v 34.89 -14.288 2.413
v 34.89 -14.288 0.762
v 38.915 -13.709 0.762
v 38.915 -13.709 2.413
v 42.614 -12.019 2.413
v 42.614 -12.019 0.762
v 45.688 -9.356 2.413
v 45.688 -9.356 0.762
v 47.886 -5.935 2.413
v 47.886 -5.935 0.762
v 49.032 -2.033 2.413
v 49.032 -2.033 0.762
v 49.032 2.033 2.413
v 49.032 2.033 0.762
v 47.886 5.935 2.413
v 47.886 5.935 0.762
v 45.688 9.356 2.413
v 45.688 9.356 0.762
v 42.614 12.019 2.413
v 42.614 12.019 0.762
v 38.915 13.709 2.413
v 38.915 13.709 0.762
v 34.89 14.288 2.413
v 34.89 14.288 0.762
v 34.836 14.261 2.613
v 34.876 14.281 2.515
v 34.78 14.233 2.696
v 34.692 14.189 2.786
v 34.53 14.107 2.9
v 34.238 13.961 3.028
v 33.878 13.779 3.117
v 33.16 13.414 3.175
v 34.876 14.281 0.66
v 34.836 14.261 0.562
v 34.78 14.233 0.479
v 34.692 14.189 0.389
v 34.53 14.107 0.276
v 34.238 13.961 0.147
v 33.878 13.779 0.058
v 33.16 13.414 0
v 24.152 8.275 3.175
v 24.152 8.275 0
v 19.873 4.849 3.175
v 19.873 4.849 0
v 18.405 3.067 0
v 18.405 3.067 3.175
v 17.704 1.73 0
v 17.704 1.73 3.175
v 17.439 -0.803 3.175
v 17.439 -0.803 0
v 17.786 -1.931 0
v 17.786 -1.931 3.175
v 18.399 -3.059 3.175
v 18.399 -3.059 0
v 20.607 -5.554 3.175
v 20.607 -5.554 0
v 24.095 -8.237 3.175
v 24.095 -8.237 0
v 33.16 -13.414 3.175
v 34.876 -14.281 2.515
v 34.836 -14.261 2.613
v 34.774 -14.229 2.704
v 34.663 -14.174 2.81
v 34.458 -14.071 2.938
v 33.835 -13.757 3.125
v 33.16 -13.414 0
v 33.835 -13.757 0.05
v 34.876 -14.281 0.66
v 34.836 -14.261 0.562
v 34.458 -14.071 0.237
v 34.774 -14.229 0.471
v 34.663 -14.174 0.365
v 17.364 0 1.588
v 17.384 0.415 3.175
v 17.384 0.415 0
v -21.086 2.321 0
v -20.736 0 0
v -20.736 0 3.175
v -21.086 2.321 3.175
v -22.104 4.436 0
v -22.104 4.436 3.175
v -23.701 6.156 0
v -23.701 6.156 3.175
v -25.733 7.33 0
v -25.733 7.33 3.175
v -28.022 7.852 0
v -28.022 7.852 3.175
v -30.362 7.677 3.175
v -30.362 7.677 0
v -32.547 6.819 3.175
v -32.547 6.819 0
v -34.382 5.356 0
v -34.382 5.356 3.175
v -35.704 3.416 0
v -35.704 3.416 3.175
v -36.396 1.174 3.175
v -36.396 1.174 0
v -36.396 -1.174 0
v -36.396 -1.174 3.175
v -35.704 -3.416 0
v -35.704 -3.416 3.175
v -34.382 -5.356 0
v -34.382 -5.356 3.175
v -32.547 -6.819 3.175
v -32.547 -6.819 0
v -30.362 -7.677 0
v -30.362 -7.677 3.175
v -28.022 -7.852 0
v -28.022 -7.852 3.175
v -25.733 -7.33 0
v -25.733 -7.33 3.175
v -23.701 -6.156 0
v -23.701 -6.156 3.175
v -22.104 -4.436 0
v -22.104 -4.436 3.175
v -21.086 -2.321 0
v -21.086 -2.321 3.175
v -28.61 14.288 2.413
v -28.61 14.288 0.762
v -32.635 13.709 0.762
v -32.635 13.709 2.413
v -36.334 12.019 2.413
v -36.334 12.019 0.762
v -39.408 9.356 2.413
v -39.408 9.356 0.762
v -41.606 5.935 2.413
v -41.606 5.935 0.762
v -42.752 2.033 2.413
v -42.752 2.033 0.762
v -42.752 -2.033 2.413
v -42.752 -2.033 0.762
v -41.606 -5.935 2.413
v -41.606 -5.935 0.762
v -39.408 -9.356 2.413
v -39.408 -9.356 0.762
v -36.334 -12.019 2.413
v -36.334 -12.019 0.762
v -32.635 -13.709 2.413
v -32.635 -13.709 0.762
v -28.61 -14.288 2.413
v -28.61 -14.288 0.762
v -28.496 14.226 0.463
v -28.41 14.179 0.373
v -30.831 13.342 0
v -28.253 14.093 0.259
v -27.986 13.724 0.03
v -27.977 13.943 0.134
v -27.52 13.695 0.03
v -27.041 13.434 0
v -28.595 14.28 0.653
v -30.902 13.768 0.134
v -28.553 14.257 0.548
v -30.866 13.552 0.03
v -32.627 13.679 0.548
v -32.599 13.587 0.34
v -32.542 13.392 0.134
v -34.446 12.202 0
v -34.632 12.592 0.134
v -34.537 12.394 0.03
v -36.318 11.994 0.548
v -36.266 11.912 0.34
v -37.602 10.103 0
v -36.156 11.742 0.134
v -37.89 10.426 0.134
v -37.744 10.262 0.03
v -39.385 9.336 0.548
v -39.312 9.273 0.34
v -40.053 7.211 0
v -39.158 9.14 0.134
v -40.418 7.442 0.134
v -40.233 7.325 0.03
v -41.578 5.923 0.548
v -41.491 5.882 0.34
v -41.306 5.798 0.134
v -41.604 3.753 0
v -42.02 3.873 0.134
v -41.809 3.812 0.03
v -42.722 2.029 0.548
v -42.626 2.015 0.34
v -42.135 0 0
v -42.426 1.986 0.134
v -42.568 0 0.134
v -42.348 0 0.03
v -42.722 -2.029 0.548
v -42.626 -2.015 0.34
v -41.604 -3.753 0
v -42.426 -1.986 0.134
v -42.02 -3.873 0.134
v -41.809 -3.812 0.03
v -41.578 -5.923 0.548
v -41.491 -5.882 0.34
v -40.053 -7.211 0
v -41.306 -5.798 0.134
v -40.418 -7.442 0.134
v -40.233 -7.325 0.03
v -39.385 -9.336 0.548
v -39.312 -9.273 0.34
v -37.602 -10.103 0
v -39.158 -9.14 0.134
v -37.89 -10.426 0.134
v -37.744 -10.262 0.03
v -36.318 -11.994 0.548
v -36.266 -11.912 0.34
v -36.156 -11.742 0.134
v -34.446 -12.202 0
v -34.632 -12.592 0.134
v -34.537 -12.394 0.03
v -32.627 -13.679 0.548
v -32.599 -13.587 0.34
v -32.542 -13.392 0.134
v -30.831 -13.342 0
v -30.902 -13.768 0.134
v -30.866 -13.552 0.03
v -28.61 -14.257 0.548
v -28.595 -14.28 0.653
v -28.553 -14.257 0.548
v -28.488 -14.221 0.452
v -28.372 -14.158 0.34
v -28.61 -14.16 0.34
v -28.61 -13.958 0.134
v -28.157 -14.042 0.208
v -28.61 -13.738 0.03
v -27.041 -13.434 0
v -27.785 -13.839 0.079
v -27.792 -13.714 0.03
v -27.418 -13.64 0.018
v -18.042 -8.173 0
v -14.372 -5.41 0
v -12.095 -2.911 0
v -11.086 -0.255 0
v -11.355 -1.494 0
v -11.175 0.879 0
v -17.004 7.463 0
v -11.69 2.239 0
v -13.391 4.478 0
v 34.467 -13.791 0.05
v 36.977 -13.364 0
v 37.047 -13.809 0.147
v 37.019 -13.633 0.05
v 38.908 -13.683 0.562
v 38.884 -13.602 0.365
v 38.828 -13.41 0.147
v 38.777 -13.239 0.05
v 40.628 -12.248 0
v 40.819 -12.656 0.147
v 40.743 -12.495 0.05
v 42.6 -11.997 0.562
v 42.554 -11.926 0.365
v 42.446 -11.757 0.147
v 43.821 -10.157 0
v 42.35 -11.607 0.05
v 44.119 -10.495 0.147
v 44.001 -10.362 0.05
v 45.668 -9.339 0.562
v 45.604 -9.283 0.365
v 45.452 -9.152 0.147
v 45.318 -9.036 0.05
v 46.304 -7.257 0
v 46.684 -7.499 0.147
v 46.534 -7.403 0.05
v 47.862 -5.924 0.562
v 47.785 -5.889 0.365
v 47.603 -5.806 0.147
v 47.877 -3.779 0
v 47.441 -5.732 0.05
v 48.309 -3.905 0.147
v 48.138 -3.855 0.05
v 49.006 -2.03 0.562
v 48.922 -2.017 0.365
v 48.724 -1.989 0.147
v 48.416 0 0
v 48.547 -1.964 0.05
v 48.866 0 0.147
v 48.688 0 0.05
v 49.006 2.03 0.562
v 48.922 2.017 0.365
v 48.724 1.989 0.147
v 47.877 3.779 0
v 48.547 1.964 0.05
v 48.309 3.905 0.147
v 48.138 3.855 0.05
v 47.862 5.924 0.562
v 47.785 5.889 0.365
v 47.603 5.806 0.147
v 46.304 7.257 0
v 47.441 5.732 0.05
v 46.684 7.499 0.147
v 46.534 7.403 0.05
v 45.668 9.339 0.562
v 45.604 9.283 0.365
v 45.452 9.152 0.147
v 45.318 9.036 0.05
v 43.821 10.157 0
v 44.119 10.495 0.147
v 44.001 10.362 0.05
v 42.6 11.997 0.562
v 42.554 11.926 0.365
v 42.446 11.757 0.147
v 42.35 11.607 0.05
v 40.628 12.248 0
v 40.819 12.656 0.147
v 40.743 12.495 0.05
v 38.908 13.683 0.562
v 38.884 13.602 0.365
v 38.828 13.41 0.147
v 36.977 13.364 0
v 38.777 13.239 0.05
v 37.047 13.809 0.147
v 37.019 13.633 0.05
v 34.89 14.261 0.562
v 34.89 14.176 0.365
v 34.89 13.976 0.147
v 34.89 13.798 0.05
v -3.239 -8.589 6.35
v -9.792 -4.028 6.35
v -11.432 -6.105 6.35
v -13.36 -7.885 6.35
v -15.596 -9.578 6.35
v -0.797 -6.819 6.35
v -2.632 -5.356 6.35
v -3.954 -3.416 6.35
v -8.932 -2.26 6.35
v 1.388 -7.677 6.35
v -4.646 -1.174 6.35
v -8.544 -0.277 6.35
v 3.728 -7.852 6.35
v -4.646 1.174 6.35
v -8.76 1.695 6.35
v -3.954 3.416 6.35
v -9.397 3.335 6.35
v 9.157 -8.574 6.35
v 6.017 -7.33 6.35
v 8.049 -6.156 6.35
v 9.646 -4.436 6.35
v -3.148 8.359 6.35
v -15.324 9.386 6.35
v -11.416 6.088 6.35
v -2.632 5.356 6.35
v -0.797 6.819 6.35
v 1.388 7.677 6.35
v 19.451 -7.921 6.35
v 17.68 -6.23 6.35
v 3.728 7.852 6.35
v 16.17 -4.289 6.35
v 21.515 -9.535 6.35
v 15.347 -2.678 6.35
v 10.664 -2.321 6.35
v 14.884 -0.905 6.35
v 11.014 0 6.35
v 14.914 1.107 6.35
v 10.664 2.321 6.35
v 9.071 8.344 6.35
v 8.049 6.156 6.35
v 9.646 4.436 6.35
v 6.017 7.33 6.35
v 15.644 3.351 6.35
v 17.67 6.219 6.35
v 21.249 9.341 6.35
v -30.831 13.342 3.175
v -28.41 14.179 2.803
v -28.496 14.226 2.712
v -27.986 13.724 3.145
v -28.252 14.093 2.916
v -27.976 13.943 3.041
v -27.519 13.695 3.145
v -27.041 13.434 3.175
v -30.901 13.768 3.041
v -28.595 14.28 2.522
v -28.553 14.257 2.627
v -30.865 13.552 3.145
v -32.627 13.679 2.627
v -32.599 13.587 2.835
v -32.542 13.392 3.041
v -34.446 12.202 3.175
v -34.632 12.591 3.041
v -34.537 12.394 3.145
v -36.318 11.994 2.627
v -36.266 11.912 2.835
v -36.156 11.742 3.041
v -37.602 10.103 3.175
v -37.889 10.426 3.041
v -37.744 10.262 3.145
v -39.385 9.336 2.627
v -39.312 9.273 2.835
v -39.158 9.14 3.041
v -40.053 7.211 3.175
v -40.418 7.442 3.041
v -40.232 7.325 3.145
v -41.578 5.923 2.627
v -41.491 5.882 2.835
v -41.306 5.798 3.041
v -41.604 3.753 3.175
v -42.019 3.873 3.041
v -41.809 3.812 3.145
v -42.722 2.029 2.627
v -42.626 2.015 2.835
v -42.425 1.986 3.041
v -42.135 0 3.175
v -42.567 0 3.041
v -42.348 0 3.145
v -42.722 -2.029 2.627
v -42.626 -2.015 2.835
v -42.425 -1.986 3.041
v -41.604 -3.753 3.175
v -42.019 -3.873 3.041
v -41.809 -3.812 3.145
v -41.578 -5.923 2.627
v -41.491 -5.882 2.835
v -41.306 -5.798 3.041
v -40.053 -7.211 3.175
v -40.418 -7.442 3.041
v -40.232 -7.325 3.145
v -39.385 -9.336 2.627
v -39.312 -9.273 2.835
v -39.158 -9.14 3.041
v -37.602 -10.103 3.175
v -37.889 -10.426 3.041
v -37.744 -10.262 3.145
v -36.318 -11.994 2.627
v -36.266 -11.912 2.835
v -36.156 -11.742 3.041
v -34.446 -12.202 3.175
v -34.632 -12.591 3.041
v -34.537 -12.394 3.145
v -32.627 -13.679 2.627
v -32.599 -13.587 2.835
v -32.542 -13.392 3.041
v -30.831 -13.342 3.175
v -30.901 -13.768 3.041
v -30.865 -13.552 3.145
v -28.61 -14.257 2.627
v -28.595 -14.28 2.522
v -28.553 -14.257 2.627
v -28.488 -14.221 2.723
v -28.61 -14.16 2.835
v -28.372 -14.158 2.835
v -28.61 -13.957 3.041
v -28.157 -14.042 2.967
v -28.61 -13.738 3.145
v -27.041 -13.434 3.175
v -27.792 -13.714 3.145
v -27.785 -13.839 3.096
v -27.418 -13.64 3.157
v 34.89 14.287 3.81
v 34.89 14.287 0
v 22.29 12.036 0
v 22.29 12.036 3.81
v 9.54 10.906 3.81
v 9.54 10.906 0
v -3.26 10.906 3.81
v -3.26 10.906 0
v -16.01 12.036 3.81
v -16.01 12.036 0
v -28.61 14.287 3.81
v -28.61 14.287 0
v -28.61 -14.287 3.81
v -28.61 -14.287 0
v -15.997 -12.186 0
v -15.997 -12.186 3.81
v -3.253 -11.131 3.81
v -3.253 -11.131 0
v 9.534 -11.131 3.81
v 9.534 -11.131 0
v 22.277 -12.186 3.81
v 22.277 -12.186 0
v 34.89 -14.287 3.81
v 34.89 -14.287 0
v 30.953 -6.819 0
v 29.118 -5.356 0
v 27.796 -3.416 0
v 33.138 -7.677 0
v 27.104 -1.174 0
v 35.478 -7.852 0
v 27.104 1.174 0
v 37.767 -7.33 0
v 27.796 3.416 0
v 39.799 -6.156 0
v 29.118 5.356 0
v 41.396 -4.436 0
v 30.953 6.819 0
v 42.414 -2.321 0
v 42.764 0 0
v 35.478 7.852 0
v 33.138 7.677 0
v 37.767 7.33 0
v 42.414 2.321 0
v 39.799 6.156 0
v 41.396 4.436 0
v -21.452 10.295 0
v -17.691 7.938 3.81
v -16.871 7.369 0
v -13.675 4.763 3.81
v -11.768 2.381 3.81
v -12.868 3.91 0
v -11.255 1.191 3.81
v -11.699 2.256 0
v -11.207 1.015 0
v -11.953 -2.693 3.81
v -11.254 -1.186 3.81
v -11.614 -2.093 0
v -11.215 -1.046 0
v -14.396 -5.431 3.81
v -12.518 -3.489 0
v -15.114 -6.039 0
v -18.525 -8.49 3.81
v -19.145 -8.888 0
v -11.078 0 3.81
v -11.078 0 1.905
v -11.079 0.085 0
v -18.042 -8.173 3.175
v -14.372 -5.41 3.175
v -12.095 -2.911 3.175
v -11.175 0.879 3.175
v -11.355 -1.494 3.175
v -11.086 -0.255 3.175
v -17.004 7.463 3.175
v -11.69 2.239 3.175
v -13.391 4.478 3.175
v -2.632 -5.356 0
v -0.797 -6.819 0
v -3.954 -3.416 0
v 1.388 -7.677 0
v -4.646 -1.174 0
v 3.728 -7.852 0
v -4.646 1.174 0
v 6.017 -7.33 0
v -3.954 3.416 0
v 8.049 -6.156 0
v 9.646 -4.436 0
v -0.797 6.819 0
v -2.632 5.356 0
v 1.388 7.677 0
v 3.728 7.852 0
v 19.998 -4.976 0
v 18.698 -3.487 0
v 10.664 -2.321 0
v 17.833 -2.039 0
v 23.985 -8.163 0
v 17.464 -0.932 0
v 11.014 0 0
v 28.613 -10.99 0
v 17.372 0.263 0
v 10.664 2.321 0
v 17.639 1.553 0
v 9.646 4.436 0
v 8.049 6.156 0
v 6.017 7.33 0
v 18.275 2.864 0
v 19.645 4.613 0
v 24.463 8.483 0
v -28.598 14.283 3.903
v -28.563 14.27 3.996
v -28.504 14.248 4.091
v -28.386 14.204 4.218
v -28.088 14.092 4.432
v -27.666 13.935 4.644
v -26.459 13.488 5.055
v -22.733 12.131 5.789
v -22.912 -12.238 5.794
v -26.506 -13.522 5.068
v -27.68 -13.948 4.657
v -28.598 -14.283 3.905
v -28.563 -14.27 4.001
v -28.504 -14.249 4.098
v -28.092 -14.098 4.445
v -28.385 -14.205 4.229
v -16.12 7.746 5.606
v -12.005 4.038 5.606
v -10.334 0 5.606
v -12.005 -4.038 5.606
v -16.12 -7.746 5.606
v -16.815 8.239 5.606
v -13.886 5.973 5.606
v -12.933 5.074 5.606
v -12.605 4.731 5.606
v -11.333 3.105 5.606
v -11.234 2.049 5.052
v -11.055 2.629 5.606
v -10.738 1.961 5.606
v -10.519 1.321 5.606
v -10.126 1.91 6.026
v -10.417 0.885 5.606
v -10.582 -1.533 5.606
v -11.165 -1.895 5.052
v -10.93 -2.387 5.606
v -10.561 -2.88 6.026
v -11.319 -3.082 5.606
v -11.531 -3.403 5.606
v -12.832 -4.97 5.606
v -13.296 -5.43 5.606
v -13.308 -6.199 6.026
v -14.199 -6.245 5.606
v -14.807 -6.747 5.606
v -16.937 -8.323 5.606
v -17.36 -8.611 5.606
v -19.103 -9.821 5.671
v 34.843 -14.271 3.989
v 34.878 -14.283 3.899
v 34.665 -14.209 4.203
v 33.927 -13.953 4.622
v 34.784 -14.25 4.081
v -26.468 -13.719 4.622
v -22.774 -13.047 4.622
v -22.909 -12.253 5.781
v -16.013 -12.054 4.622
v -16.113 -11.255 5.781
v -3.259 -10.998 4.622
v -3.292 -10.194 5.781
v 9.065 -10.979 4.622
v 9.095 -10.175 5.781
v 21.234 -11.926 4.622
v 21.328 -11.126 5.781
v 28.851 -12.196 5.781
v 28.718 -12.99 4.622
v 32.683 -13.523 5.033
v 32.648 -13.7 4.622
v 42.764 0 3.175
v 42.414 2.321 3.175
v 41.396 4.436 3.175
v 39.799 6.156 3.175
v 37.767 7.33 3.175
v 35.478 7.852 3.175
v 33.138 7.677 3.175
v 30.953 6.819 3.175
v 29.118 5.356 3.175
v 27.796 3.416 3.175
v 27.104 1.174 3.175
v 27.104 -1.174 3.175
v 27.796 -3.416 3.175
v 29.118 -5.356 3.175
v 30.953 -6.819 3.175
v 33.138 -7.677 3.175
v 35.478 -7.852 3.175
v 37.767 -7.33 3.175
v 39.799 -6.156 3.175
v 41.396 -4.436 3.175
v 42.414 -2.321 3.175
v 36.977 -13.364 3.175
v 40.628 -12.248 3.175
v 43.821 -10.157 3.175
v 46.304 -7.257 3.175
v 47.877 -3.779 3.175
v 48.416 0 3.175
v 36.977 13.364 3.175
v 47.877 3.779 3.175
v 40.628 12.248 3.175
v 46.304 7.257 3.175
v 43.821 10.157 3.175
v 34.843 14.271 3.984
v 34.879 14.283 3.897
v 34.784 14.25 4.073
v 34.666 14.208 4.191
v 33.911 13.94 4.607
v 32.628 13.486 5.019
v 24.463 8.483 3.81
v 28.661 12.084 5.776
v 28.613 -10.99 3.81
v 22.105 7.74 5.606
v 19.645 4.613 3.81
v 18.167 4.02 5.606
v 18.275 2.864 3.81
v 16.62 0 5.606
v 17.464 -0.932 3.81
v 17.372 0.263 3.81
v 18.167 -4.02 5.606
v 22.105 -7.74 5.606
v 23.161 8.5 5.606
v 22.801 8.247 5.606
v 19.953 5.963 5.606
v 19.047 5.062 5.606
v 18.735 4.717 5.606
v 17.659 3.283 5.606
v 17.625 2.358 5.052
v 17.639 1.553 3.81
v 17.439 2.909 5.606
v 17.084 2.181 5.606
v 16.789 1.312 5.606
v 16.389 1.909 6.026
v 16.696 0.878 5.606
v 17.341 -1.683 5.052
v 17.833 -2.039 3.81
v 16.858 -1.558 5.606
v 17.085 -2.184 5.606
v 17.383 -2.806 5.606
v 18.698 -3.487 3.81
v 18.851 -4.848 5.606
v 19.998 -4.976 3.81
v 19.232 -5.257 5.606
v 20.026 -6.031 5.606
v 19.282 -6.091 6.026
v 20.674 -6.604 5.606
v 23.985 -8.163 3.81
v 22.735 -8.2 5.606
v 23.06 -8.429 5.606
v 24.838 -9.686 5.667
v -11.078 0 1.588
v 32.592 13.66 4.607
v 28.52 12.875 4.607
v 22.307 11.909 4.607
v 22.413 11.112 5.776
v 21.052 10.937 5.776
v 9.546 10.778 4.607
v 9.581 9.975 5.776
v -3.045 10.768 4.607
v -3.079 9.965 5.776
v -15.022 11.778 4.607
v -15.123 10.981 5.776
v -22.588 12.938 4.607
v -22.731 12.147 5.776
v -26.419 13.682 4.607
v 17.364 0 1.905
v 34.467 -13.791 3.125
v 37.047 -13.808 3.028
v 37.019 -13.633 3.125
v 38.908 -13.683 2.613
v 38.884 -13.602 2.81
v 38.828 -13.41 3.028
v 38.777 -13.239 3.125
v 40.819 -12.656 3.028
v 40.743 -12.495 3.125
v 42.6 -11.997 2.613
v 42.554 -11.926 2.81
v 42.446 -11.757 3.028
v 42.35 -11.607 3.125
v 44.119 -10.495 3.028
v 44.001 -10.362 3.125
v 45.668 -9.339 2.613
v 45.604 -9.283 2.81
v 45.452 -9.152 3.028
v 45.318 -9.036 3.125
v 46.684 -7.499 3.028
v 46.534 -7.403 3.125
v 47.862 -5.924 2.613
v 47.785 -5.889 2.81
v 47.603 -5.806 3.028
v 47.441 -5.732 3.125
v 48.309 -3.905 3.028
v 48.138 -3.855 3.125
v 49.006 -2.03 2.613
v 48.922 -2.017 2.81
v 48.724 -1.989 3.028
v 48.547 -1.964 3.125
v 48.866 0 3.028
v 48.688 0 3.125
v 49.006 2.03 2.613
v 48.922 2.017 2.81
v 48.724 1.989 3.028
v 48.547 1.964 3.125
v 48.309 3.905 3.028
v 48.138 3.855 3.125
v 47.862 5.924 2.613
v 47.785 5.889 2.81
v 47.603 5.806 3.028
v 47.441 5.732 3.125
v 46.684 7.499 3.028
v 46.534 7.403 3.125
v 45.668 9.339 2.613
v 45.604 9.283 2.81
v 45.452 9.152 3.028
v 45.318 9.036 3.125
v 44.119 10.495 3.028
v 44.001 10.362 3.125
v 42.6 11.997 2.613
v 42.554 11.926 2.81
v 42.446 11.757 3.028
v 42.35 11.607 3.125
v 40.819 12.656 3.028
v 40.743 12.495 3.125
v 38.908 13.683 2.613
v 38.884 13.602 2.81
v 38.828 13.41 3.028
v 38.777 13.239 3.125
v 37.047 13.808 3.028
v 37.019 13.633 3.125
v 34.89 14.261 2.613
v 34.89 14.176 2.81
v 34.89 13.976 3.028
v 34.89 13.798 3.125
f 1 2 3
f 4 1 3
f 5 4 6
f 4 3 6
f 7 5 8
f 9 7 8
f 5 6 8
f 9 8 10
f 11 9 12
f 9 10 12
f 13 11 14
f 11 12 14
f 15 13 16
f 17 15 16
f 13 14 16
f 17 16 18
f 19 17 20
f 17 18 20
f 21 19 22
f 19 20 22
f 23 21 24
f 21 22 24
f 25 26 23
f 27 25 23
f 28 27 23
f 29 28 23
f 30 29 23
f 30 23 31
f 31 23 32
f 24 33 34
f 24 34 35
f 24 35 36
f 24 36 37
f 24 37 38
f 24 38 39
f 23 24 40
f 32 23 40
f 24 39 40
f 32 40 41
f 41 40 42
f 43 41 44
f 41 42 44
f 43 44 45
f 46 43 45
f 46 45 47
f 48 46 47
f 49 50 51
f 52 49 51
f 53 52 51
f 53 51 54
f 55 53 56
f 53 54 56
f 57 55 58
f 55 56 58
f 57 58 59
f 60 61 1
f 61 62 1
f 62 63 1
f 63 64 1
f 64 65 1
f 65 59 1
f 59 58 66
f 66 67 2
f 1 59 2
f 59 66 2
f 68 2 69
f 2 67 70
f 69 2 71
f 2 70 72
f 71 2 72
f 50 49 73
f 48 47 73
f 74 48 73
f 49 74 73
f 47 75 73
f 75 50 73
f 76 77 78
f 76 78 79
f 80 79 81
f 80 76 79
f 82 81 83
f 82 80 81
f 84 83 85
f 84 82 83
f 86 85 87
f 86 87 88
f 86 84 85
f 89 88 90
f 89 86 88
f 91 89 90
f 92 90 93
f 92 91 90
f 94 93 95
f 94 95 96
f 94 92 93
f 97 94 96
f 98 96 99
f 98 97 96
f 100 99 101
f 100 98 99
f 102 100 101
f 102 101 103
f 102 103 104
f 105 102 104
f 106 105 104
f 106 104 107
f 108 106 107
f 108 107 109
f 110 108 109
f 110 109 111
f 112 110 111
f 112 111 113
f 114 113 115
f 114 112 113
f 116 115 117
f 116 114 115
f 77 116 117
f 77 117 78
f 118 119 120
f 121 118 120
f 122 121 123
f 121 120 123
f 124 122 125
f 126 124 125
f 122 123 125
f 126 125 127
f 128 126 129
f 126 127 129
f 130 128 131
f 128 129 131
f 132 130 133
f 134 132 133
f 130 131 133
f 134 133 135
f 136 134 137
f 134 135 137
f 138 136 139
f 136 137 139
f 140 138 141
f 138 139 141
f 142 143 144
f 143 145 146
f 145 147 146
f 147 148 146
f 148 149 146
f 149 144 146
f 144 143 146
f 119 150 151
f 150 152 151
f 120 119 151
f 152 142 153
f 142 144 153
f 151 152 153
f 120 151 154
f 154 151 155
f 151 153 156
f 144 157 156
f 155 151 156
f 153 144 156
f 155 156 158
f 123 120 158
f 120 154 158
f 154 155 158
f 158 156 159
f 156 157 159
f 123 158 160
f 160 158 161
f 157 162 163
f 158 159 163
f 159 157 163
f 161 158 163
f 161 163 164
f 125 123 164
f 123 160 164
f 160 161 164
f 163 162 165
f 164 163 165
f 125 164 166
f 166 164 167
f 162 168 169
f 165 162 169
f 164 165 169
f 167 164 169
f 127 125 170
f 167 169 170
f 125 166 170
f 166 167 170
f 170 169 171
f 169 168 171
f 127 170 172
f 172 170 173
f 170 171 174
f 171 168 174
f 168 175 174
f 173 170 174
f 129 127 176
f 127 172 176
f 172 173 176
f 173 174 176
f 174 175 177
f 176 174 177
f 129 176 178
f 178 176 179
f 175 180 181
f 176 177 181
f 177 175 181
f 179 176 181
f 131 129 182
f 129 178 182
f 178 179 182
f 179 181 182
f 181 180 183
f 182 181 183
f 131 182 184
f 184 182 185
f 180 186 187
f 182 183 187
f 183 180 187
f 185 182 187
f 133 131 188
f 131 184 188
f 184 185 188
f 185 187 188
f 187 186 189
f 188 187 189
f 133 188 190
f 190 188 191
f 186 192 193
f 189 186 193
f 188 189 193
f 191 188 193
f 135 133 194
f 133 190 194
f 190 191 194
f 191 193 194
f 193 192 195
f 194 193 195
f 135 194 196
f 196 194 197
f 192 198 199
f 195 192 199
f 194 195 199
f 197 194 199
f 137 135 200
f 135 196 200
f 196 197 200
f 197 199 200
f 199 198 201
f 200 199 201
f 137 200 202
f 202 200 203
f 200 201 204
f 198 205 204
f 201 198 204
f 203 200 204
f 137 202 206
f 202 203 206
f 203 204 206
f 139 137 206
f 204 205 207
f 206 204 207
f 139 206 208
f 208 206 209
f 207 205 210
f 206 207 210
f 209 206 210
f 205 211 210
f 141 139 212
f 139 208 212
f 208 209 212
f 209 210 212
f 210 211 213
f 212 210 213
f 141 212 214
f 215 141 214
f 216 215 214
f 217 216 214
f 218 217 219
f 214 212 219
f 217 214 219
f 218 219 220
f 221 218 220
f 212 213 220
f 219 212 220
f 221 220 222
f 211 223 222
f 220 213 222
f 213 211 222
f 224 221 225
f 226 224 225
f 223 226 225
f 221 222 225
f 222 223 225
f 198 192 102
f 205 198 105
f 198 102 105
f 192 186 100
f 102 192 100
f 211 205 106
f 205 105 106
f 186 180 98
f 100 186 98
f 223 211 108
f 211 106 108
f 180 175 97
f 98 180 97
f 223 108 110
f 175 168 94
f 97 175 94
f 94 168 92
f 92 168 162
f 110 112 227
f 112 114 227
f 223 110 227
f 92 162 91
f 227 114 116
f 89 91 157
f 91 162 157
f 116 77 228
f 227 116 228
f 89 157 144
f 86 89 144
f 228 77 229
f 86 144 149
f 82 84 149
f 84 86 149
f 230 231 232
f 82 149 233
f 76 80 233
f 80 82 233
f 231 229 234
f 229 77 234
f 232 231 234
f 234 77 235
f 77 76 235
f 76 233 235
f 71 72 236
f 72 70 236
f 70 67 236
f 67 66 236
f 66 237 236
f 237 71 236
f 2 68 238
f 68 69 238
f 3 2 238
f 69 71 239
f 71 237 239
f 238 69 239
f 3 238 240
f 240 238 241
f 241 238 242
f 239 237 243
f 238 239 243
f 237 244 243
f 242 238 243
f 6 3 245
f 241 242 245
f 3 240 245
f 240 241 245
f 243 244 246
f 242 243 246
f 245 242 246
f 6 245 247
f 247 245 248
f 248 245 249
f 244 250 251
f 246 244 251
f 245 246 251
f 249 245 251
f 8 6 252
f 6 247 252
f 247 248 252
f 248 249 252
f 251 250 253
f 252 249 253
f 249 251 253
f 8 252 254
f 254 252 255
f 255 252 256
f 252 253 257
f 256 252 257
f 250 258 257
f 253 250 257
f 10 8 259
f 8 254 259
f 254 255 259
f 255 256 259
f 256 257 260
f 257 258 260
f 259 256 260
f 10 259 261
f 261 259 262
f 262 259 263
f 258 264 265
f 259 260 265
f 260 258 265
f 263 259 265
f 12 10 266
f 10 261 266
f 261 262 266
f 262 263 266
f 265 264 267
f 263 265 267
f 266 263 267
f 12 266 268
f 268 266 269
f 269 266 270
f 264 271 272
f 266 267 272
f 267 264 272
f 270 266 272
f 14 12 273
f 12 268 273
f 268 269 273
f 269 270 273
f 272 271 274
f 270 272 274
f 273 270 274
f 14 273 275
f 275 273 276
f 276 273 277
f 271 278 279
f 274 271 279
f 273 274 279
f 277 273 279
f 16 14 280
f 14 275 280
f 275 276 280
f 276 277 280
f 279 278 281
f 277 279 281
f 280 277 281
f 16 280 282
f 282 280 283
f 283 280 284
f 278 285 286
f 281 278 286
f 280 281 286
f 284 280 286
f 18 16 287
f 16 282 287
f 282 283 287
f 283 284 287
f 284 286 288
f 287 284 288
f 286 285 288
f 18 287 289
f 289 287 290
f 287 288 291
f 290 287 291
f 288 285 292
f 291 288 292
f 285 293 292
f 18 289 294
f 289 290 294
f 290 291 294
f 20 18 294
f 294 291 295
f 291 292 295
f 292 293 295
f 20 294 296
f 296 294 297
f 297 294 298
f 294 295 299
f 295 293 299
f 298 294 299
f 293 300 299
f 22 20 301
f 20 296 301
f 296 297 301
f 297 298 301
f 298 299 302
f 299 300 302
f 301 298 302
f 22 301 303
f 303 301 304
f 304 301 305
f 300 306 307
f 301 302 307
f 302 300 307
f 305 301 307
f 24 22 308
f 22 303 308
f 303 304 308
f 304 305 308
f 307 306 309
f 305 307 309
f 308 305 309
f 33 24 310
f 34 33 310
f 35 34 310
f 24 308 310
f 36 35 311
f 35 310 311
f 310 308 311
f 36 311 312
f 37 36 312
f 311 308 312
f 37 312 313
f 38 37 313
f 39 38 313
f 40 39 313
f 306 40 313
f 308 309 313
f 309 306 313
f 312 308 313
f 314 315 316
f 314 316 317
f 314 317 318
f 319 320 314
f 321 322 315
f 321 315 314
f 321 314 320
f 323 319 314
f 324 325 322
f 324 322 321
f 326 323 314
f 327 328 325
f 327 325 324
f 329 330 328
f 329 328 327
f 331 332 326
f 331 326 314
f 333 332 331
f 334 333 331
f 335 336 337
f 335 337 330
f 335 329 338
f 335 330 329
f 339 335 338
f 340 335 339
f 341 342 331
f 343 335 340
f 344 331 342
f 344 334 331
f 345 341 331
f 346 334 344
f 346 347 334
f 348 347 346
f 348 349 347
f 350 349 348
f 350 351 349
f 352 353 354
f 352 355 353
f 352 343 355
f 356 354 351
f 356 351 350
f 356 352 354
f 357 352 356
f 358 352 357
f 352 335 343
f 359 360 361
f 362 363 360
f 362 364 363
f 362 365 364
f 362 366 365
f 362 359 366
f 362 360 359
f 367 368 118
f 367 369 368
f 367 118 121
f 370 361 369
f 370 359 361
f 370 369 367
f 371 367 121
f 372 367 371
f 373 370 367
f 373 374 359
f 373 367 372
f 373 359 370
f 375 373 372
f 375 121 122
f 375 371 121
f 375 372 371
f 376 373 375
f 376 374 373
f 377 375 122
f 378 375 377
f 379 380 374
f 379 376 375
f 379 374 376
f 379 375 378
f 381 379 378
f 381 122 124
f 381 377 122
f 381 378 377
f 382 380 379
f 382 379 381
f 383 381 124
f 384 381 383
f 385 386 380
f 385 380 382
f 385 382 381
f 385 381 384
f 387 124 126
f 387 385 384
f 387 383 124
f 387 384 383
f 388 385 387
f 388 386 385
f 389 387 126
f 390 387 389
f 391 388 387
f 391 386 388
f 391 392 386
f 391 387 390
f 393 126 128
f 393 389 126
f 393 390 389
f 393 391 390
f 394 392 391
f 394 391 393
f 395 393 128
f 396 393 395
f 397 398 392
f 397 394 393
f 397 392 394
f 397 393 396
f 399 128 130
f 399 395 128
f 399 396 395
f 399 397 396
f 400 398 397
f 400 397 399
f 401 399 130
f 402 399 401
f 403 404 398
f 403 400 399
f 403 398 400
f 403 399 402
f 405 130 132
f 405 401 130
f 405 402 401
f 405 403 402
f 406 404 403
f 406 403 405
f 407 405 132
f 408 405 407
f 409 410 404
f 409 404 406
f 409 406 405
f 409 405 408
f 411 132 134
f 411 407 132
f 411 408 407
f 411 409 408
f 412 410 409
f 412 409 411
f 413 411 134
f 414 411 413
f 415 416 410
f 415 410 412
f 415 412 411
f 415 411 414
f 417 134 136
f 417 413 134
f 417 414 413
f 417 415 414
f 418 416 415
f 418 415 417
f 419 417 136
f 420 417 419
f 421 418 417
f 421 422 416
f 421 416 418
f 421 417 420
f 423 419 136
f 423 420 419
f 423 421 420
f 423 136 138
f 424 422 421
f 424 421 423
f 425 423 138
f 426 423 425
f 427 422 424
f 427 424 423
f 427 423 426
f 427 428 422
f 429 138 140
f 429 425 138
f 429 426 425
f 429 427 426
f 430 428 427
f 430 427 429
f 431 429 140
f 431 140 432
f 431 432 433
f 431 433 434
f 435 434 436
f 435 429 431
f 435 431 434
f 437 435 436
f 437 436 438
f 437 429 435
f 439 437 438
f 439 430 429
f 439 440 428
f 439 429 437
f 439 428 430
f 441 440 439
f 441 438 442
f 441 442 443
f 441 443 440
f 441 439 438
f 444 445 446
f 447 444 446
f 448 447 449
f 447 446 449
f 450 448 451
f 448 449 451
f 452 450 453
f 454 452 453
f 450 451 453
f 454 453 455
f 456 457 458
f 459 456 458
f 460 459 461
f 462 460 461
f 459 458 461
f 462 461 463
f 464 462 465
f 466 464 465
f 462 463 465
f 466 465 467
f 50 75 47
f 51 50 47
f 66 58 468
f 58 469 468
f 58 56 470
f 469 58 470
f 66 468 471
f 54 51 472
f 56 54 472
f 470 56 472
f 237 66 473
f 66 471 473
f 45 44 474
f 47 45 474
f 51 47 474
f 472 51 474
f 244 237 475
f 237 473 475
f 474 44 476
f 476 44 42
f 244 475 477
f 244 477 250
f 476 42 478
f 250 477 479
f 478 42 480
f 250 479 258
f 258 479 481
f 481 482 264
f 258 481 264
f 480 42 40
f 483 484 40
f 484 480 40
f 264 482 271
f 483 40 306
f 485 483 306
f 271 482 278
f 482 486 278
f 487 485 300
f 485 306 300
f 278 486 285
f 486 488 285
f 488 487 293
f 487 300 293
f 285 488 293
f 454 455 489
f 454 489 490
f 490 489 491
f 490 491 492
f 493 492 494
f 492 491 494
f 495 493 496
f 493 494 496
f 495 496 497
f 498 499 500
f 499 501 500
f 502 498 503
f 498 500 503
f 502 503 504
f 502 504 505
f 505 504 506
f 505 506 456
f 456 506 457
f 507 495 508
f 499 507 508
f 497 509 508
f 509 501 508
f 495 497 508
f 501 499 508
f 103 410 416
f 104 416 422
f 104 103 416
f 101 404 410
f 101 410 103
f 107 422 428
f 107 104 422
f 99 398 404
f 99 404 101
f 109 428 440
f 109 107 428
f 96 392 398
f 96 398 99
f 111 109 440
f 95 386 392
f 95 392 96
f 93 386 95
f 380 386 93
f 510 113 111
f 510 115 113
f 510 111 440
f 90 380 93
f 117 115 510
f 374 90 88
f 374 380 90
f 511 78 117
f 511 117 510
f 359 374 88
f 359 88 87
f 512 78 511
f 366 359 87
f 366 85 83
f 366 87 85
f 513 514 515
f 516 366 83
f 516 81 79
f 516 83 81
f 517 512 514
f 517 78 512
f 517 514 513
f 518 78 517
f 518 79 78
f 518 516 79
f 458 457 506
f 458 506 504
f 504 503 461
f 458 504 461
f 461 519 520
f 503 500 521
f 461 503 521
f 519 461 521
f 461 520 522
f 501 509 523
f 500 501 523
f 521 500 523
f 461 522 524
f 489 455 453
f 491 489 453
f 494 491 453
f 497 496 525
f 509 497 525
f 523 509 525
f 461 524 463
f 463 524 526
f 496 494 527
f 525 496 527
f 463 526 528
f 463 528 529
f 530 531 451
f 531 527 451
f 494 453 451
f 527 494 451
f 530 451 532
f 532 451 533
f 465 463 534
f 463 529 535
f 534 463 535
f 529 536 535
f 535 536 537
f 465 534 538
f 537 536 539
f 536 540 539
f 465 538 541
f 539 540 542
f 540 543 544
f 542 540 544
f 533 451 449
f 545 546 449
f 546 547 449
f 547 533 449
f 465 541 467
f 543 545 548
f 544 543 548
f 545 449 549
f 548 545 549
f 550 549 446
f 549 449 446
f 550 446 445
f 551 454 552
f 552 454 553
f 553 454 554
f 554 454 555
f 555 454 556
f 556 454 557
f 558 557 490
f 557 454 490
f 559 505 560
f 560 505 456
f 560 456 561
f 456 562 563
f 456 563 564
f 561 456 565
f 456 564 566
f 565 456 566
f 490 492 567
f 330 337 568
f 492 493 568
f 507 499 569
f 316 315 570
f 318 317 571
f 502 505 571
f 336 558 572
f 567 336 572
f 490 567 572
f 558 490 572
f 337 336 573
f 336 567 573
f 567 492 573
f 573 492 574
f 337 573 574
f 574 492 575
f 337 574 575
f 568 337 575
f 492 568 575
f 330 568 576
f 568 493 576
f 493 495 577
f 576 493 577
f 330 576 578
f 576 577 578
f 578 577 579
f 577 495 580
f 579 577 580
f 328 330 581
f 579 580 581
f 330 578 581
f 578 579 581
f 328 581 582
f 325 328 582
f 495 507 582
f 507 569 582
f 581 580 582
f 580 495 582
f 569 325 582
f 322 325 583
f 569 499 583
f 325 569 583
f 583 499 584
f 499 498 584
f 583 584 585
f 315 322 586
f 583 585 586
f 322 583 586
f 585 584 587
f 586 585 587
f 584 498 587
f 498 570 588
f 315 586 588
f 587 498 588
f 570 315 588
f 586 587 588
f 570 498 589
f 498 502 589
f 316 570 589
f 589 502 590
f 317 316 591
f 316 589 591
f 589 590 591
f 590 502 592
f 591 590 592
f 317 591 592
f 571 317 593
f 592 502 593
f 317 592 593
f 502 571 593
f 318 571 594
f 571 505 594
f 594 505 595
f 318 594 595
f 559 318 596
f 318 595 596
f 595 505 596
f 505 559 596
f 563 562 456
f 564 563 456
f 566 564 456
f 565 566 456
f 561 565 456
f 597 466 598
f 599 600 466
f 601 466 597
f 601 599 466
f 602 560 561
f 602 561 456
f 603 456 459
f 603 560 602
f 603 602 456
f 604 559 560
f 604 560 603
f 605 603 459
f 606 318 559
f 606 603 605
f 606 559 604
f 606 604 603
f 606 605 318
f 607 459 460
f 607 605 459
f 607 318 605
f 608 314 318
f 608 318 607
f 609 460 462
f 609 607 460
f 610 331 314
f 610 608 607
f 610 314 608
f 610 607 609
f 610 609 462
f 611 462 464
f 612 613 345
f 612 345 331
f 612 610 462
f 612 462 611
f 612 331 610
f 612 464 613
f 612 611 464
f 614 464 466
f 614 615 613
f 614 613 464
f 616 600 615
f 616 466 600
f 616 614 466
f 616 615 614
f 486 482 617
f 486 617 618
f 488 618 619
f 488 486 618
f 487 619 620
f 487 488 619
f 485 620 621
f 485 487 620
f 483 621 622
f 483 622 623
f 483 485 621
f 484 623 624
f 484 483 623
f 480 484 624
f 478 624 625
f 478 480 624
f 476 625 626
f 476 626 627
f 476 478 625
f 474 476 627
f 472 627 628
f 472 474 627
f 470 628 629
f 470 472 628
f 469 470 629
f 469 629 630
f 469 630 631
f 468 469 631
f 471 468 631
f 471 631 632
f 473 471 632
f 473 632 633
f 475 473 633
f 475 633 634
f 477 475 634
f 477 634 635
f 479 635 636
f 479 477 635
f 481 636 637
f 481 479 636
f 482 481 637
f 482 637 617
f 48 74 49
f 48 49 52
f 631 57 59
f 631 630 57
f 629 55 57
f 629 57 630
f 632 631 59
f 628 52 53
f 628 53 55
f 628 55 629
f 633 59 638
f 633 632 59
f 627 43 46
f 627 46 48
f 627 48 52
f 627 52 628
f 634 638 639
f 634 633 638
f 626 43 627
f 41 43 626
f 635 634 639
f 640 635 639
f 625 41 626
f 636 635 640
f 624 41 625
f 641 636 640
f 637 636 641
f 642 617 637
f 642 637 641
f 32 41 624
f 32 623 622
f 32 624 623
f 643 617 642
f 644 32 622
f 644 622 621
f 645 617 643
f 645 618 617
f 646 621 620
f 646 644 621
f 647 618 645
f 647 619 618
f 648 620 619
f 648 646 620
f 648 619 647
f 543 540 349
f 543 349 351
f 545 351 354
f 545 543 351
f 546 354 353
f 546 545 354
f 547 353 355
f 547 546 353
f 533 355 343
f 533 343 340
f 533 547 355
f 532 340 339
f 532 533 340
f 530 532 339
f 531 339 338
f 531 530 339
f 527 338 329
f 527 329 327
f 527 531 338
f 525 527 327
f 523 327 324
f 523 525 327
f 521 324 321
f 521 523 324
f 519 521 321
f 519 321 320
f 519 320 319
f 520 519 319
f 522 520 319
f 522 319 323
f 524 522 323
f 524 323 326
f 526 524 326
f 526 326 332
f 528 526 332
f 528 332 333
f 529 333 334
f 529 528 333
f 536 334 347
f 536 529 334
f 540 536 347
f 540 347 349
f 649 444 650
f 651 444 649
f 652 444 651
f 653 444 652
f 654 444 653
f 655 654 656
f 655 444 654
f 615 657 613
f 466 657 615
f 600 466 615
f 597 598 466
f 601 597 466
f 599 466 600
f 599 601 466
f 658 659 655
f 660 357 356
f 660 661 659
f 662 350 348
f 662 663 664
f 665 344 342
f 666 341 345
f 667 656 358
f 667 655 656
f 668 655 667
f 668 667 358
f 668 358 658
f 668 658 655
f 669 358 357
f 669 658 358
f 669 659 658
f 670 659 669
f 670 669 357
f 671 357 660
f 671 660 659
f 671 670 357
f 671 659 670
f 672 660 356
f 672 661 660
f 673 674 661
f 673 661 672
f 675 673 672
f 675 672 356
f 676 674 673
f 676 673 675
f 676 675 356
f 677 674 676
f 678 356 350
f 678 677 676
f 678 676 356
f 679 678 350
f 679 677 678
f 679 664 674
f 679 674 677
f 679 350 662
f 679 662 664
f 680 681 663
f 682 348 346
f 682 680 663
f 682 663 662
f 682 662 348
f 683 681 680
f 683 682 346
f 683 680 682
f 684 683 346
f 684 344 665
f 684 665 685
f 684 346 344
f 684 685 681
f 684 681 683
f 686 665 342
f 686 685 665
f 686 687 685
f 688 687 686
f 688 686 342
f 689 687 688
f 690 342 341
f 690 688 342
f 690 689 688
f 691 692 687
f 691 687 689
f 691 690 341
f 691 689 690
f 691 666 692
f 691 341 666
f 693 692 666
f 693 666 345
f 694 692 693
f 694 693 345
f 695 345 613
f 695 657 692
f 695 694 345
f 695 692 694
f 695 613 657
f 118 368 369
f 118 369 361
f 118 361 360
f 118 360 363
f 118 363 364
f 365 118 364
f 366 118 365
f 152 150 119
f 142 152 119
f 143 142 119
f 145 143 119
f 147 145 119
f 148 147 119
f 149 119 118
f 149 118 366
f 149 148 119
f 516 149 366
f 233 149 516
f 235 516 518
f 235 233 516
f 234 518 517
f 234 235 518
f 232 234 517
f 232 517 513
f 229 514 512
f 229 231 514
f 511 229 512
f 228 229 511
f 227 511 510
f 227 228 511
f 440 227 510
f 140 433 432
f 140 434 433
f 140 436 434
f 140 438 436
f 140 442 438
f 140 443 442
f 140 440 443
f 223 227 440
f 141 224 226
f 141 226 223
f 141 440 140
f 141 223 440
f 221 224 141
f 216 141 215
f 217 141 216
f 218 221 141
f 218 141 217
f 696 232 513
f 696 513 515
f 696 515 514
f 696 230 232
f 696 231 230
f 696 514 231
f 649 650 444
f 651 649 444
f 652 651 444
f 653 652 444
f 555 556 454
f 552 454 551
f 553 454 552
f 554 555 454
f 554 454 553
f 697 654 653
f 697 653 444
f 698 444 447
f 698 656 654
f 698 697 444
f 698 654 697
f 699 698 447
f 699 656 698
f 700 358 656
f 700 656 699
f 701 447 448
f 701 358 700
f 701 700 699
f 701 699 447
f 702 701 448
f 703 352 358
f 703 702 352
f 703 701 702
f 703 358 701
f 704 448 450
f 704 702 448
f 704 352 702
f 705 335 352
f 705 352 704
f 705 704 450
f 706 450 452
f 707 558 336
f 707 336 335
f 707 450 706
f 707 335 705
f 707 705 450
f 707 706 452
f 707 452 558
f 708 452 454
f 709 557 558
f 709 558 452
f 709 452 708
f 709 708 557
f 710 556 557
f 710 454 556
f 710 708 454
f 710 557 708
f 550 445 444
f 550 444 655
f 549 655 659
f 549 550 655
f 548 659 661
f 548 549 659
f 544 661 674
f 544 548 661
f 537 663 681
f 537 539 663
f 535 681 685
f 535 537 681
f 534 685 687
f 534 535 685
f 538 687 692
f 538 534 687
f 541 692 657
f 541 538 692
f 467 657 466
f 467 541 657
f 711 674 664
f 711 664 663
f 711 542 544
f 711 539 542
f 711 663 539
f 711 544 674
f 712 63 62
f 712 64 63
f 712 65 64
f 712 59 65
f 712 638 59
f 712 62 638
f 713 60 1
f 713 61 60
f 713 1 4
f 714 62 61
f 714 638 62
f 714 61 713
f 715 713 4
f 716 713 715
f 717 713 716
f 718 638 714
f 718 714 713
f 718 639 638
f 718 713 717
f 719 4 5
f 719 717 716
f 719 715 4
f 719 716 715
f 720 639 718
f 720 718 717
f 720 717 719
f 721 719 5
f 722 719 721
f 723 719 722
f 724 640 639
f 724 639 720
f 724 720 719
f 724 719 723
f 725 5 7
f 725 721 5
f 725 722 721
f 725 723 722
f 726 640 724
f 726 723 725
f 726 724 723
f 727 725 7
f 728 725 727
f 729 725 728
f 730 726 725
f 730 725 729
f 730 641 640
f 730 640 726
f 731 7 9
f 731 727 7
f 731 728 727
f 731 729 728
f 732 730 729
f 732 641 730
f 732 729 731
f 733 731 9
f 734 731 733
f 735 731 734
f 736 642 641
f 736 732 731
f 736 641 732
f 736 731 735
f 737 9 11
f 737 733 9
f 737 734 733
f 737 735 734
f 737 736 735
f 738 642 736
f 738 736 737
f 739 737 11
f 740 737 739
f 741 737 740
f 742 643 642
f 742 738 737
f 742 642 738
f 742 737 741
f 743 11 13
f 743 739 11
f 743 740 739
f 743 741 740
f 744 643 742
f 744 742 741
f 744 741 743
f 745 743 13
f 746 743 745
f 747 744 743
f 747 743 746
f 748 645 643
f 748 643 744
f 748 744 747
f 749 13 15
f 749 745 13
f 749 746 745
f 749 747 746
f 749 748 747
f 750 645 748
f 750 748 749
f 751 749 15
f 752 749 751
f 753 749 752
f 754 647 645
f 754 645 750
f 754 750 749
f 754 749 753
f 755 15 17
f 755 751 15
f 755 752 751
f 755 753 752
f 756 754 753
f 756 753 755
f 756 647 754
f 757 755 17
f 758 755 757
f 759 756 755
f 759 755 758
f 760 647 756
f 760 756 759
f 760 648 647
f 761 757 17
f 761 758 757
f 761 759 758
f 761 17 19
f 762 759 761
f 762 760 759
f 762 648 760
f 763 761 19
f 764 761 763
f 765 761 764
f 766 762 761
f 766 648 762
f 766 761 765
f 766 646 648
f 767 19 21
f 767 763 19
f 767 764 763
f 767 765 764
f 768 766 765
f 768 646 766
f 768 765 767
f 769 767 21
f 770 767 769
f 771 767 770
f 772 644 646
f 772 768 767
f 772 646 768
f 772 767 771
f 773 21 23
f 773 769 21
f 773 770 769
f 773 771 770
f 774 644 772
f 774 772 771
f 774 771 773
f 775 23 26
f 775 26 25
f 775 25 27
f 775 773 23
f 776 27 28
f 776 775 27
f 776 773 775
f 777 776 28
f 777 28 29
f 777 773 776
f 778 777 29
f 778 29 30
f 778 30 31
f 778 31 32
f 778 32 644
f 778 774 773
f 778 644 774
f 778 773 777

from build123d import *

# Parameters (mm, degrees)
F0_R     = 7.874
F1_DEPTH = 3.175
F2_DEPTH = 6.35
F3_R     = 0.762
F4_R     = 2.54


with BuildPart() as f1:
    # F0 (on Top) → F1 (new body)
    with BuildSketch(Plane.XY):
        with BuildLine():
            ThreePointArc((-28.609937, 14.2875), (-42.897437, 0), (-28.609937, -14.2875))
            add(Edge.make_bspline(
                [(-28.609937, 14.2875), (-19.843796, 9.525), (-2.311514, 0), (-19.843796, -9.525), (-28.609937, -14.2875)],
                knots=[0, 0, 0, 0, 22.616666, 45.233331, 45.233331, 45.233331, 45.233331], degree=3))
        make_face()
        with Locations((-28.609937, 0)):
            Circle(F0_R, mode=Mode.SUBTRACT)
        with BuildLine():
            add(Edge.make_bspline(
                [(34.890063, 14.2875), (25.350589, 9.525), (9.377537, 0), (25.350589, -9.525), (34.890063, -14.2875)],
                knots=[0, 0, 0, 0, 22.611796, 45.223593, 45.223593, 45.223593, 45.223593], degree=3))
            ThreePointArc((34.890063, -14.2875), (49.177563, 0), (34.890063, 14.2875))
        make_face()
        with Locations((34.890063, 0)):
            Circle(F0_R, mode=Mode.SUBTRACT)
    extrude(amount=F1_DEPTH)

    # F3
    f3_edges = [f1.edges().sort_by_distance(p)[0] for p in [
        (-42.897437, 0, 3.175),
        (49.177563, 0, 3.175),
        (49.177563, 0, 0),
        (-42.897437, 0, 0),
    ]]
    fillet(f3_edges, radius=F3_R)


with BuildPart() as f2:
    # F0 (on Top) → F2 (new body)
    with BuildSketch(Plane.XY):
        with BuildLine():
            ThreePointArc((-28.609937, -14.2875), (3.140063, -10.999431), (34.890063, -14.2875))
            add(Edge.make_bspline(
                [(34.890063, 14.2875), (25.350589, 9.525), (9.377537, 0), (25.350589, -9.525), (34.890063, -14.2875)],
                knots=[0, 0, 0, 0, 22.611796, 45.223593, 45.223593, 45.223593, 45.223593], degree=3))
            ThreePointArc((34.890063, 14.2875), (3.140063, 10.764632), (-28.609937, 14.2875))
            add(Edge.make_bspline(
                [(-28.609937, 14.2875), (-19.843796, 9.525), (-2.311514, 0), (-19.843796, -9.525), (-28.609937, -14.2875)],
                knots=[0, 0, 0, 0, 22.616666, 45.233331, 45.233331, 45.233331, 45.233331], degree=3))
        make_face()
        with Locations((3.140063, 0)):
            Circle(F0_R, mode=Mode.SUBTRACT)
    extrude(amount=F2_DEPTH)

    # F4
    f4_edges = [f2.edges().sort_by_distance(p)[0] for p in [
        (3.140063, -10.999431, 6.35),
        (3.140063, 10.764632, 6.35),
        (17.364063, 0, 6.35),
        (-11.077655, 0, 6.35),
    ]]
    fillet(f4_edges, radius=F4_R)


solid = Compound([f1.part, f2.part])
